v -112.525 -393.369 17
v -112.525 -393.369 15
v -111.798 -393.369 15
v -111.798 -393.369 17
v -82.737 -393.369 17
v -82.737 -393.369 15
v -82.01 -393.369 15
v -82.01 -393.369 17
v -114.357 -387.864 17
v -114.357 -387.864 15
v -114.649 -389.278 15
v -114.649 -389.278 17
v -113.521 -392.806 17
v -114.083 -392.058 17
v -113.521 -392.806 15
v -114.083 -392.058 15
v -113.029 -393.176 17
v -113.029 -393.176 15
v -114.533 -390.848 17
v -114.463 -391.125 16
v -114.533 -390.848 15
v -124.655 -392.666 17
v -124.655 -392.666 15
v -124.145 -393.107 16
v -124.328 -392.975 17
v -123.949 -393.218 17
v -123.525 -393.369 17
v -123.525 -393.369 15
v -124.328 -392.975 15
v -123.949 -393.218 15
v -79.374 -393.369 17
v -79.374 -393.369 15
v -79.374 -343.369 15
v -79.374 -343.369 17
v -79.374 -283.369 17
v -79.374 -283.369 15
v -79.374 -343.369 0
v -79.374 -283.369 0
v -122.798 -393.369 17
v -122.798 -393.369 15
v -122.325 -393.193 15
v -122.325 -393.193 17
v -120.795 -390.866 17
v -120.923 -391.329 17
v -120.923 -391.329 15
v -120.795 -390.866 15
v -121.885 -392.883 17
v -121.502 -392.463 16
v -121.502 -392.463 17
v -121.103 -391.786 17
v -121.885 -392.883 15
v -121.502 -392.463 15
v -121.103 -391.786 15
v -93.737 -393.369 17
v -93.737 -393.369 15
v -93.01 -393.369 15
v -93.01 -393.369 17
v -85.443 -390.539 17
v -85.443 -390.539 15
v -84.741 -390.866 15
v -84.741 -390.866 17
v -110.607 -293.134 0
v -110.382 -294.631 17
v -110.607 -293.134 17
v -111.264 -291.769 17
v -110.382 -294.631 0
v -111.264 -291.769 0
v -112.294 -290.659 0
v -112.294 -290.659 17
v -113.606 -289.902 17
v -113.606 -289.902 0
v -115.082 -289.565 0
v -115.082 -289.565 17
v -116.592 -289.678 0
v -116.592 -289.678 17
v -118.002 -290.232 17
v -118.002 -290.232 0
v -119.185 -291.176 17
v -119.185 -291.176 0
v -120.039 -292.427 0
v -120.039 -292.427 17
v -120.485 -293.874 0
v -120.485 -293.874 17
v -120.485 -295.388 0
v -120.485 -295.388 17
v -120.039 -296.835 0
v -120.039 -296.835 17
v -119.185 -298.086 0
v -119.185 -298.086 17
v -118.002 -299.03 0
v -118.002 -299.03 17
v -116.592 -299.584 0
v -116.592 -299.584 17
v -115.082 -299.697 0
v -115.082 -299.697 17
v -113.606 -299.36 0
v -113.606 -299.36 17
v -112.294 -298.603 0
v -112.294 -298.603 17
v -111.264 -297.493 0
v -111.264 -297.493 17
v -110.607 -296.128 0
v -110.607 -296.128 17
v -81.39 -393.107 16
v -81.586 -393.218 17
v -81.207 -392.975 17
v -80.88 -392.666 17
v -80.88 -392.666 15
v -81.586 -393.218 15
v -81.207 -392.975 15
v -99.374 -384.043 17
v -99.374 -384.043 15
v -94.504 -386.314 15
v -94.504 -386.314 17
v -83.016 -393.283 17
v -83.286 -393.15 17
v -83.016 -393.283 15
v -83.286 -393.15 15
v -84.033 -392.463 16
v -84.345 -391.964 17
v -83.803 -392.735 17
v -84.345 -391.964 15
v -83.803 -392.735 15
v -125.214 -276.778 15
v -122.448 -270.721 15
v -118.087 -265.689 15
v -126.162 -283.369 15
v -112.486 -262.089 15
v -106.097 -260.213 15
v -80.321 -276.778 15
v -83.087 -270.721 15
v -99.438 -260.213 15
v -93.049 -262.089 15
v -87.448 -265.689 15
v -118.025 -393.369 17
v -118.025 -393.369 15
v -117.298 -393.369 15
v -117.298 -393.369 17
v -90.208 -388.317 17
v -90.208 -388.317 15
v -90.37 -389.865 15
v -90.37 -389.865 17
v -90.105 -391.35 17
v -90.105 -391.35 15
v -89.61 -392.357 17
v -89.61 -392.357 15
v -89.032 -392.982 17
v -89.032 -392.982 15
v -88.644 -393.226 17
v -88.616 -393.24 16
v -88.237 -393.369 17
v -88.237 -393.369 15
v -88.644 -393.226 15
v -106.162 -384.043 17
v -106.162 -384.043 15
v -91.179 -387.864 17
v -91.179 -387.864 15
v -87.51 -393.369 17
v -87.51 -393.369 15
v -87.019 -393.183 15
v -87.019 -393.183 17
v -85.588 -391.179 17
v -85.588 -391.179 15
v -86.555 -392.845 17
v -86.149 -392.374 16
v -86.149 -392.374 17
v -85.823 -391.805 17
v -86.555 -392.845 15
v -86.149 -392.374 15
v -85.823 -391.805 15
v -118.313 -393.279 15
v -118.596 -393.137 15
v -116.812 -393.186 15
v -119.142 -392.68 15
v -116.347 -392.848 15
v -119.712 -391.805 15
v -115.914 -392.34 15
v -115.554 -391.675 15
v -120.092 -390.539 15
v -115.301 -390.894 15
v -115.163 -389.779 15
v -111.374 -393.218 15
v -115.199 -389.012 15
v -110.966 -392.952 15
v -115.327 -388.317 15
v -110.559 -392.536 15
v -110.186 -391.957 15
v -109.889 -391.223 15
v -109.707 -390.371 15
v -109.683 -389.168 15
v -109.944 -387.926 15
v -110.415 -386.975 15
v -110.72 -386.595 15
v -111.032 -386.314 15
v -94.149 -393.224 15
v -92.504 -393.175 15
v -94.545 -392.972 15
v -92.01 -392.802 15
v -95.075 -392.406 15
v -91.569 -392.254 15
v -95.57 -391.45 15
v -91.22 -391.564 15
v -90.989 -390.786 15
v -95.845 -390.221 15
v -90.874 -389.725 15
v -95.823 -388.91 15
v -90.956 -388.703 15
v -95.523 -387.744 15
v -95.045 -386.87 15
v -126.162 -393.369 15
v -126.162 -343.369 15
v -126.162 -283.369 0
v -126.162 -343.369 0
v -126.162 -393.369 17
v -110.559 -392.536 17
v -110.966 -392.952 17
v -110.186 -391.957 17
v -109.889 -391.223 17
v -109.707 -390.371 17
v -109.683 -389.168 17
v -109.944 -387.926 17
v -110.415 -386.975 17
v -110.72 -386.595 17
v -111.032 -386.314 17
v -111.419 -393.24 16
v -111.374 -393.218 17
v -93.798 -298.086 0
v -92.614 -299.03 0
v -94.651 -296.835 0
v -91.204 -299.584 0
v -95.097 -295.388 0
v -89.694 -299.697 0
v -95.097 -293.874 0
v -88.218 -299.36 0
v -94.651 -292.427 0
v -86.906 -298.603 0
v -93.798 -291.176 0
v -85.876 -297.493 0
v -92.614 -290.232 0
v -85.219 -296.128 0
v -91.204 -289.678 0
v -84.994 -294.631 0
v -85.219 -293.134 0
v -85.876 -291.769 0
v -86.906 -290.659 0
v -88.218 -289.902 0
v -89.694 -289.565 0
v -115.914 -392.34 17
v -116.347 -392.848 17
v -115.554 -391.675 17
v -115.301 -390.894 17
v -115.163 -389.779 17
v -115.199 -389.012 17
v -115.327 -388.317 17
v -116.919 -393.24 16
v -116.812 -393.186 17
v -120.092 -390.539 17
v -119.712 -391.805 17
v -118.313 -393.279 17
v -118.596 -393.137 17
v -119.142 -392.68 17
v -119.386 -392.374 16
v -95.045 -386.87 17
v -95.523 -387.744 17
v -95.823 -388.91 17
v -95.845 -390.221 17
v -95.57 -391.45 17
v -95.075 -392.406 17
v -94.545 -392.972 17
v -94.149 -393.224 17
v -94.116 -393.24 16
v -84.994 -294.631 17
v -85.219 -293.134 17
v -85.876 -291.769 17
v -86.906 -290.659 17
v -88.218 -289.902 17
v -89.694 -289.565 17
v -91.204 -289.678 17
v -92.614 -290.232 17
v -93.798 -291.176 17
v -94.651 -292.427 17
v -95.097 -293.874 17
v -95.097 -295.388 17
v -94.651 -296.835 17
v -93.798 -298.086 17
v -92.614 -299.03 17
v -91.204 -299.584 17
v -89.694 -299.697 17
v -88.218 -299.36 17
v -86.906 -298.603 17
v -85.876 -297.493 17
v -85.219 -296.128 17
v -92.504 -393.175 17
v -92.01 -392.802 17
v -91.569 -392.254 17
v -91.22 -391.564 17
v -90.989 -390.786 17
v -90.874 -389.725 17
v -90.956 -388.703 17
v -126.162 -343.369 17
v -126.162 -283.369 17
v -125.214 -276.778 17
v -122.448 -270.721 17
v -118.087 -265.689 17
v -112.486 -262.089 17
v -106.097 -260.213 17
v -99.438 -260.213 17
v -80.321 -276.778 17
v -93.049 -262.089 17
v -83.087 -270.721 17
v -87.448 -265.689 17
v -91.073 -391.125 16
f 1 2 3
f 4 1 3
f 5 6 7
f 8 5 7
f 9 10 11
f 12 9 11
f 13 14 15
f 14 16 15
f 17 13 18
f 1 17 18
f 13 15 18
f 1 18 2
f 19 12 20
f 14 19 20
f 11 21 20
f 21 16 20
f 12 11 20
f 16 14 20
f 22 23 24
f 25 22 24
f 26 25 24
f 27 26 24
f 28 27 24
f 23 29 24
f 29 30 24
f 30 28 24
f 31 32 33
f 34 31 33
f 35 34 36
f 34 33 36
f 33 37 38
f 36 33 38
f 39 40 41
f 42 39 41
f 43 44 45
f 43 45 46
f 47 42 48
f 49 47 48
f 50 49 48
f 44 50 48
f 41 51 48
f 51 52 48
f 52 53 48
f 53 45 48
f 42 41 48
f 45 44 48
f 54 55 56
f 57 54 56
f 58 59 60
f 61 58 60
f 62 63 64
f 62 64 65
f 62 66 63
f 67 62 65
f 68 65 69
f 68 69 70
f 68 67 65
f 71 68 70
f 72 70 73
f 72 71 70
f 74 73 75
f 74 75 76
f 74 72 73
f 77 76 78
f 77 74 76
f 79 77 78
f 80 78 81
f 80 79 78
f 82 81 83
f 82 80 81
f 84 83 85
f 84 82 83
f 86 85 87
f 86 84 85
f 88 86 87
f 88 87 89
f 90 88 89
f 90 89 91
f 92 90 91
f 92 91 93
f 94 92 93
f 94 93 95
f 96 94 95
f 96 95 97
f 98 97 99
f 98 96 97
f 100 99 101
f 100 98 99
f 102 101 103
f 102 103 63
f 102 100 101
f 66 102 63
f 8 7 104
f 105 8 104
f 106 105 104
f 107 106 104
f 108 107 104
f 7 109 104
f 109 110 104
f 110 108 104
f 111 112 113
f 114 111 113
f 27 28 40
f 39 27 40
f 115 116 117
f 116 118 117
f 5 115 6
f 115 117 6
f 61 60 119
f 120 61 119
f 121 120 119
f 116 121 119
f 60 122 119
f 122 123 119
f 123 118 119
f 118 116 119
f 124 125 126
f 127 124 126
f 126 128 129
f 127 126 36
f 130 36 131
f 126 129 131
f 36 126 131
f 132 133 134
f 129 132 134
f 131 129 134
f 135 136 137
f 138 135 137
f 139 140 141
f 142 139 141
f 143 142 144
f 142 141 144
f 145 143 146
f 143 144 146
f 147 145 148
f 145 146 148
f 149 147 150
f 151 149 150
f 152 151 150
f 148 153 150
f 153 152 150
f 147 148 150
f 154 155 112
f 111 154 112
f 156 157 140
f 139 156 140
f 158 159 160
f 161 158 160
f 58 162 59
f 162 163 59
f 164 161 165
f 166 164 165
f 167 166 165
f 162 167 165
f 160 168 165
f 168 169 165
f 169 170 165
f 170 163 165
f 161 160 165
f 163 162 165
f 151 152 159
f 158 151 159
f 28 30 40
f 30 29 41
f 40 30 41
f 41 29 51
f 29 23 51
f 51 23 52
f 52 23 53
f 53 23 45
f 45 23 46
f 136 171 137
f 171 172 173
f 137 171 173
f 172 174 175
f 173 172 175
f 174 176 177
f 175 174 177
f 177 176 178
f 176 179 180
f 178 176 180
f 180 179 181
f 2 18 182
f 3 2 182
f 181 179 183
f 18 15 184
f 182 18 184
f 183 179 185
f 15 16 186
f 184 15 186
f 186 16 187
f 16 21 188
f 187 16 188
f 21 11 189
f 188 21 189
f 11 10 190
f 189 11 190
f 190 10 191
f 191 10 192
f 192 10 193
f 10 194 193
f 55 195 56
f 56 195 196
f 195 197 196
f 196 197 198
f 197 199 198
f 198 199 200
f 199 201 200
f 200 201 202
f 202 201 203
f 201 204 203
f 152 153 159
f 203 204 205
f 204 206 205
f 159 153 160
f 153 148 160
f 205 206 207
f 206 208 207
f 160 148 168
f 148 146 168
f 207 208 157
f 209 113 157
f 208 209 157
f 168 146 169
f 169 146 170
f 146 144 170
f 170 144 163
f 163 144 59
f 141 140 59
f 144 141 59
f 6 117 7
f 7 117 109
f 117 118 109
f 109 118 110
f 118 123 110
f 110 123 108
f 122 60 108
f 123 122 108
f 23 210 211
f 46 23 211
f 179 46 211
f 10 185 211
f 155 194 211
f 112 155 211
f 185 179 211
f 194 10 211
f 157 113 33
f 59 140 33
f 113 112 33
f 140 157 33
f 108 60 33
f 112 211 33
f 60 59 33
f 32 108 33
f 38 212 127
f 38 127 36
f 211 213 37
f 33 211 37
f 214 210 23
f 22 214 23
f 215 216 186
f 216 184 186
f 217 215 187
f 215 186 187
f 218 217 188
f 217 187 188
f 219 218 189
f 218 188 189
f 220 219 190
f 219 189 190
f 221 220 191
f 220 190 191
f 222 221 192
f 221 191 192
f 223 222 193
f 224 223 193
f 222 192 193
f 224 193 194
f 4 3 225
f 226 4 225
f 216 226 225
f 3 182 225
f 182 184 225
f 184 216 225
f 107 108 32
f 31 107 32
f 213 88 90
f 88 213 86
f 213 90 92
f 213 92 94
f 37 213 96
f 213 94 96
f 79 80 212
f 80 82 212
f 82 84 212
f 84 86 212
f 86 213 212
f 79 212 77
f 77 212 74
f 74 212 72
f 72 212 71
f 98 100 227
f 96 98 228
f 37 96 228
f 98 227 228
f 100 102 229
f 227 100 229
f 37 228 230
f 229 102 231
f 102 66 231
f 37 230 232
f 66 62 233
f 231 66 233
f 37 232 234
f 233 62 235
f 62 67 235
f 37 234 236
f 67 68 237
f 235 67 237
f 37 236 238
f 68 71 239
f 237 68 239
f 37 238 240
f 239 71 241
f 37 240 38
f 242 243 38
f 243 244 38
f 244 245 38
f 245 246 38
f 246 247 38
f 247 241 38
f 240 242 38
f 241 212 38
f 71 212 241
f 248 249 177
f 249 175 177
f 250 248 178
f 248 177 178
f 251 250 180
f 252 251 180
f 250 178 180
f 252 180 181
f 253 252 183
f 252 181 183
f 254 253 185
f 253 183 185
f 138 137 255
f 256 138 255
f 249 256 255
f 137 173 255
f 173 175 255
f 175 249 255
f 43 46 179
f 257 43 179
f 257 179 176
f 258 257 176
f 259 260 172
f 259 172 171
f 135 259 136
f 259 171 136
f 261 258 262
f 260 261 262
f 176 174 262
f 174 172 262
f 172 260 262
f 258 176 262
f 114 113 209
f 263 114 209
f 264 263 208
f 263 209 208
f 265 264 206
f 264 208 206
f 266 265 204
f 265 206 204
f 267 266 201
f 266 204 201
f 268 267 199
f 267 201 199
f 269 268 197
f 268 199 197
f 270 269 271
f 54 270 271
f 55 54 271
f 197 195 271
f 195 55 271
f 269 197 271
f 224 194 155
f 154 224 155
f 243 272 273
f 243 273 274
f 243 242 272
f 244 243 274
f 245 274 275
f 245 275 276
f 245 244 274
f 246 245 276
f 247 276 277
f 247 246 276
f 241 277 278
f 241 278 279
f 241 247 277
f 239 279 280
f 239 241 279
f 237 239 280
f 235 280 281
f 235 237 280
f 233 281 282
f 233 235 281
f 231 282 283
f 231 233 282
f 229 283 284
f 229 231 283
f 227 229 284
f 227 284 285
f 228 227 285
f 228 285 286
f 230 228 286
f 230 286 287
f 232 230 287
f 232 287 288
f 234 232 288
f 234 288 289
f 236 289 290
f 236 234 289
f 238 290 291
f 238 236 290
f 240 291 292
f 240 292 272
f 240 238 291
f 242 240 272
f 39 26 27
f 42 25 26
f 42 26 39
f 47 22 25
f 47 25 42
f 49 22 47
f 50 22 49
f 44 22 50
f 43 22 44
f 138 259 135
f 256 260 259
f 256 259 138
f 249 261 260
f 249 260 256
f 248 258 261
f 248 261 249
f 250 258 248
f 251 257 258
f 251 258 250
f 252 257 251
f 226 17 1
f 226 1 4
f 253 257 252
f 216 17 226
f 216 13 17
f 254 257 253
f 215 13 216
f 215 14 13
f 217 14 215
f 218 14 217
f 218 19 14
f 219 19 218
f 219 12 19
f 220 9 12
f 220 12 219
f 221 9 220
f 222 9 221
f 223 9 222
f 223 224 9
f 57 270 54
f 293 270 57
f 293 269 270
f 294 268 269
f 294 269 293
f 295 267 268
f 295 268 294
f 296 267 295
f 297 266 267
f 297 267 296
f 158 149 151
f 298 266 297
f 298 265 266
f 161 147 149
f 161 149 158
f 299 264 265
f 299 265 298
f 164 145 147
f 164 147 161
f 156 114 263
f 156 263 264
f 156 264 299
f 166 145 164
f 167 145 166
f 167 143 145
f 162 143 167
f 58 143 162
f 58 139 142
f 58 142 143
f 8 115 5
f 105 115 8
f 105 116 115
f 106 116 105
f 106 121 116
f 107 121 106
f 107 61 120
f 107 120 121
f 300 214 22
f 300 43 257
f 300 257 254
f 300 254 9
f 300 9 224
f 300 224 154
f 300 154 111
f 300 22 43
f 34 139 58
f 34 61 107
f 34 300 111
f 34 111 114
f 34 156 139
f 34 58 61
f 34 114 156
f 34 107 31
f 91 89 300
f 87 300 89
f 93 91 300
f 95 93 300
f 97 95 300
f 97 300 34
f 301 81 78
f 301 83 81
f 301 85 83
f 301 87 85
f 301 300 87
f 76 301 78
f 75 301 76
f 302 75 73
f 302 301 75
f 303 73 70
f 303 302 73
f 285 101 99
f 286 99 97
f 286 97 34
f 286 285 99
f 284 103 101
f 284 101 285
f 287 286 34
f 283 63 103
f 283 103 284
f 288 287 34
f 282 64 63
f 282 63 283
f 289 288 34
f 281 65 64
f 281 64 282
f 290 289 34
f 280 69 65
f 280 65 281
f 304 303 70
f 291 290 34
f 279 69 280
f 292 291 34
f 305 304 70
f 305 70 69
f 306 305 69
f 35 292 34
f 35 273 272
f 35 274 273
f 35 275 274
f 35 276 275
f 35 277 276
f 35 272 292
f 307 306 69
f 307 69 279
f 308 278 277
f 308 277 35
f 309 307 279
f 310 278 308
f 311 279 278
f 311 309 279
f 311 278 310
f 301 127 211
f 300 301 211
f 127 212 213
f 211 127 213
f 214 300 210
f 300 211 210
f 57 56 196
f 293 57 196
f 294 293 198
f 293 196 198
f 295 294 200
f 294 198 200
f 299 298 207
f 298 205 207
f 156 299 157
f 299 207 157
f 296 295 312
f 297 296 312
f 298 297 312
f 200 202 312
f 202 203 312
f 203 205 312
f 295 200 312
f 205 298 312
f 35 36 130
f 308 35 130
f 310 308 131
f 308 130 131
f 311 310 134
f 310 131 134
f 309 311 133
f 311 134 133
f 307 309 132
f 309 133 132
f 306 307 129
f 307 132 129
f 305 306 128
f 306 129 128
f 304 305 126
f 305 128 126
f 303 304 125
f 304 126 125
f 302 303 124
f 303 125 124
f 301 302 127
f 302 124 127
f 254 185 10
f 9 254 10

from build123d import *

# Parameters (mm, degrees)
SKETCH1_W           = 46.787939469
SKETCH1_H           = 60
SKETCH1_R           = 5.08
BOSS_EXTRUDE1_DEPTH = 15
SKETCH2_W           = 46.787939469
SKETCH2_H           = 60
SKETCH2_R           = 5.08
BOSS_EXTRUDE2_DEPTH = 2


with BuildPart() as part:
    # Sketch1 → Boss-Extrude1 (new body)
    with BuildSketch(Plane.XY):
        with Locations((-102.767623853, -313.368909969)):
            Rectangle(SKETCH1_W, SKETCH1_H)
        with Locations((-90.073654119, -294.630909969)):
            Circle(SKETCH1_R, mode=Mode.SUBTRACT)
        with Locations((-115.461593588, -294.630909969)):
            Circle(SKETCH1_R, mode=Mode.SUBTRACT)
    extrude(amount=BOSS_EXTRUDE1_DEPTH)

    # Sketch2 → Boss-Extrude2 (add)
    with BuildSketch(Plane.XY.offset(15)):
        with BuildLine():
            Line((-79.373654119, -343.368909969), (-102.767623854, -343.368909969))
            Line((-102.767623854, -343.368909969), (-102.767623854, -384.042756806))
            Line((-102.767623854, -384.042756806), (-99.373654119, -384.042756806))
            Line((-99.373654119, -384.042756806), (-94.503579918, -386.313709702))
            add(Edge.make_bspline(
                [(-94.503579918, -386.313709702), (-100.00398624, -390.494082743), (-94.115799531, -393.239789298), (-93.929989905, -393.32643375), (-93.73748043, -393.368909969)],
                knots=[0.468972903, 0.468972903, 0.468972903, 2.84019184, 2.84019184, 3.029420352, 3.029420352, 3.029420352], degree=2, weights=[1, 0.37573231, 1, 0.950182059, 0.908315281]))
            Line((-93.73748043, -393.368909969), (-93.009827808, -393.368909969))
            add(Edge.make_bspline(
                [(-93.009827808, -393.368909969), (-89.462741956, -392.586263836), (-91.178526324, -387.864207656)],
                knots=[3.345008297, 3.345008297, 3.345008297, 5.211410777, 5.211410777, 5.211410777], degree=2, weights=[0.790783298, 0.508634675, 1]))
            Line((-91.178526324, -387.864207656), (-90.208062599, -388.316742323))
            add(Edge.make_bspline(
                [(-90.208062599, -388.316742323), (-91.162547167, -392.052221372), (-88.615799531, -393.239789298), (-88.429989905, -393.32643375), (-88.23748043, -393.368909969)],
                knots=[1.204788076, 1.204788076, 1.204788076, 2.84019184, 2.84019184, 3.008967996, 3.008967996, 3.008967996], degree=2, weights=[1, 0.683899664, 1, 0.967377965, 0.941489216]))
            Line((-88.23748043, -393.368909969), (-87.509827808, -393.368909969))
            add(Edge.make_bspline(
                [(-87.509827808, -393.368909969), (-85.839475159, -393.000355303), (-85.443416113, -390.538533468)],
                knots=[3.304458938, 3.304458938, 3.304458938, 4.475595603, 4.475595603, 4.475595603], degree=2, weights=[0.871477119, 0.773635905, 1]))
            Line((-85.443416113, -390.538533468), (-84.740509949, -390.866303995))
            add(Edge.make_bspline(
                [(-84.740509949, -390.866303995), (-84.248679529, -393.03547171), (-82.73748043, -393.368909969)],
                knots=[1.898629299, 1.898629299, 1.898629299, 2.984182814, 2.984182814, 2.984182814], degree=2, weights=[1, 0.762799808, 0.799074283]))
            Line((-82.73748043, -393.368909969), (-82.009827808, -393.368909969))
            add(Edge.make_bspline(
                [(-82.009827808, -393.368909969), (-81.386018968, -393.231269777), (-80.880341234, -392.666330229)],
                knots=[3.261132643, 3.261132643, 3.261132643, 3.781754381, 3.781754381, 3.781754381], degree=2, weights=[0.83538307, 0.886240914, 1]))
            Line((-80.880341234, -392.666330229), (-79.373654119, -393.368909969))
            Line((-79.373654119, -393.368909969), (-79.373654119, -343.368909969))
        make_face()
        with BuildLine():
            Line((-126.161593588, -343.368909969), (-126.161593588, -393.368909969))
            Line((-126.161593588, -393.368909969), (-124.654906474, -392.666330229))
            add(Edge.make_bspline(
                [(-124.654906474, -392.666330229), (-124.14922874, -393.231269777), (-123.525419899, -393.368909969)],
                knots=[2.501430927, 2.501430927, 2.501430927, 3.022052664, 3.022052664, 3.022052664], degree=2, weights=[1, 0.886240914, 0.83538307]))
            Line((-123.525419899, -393.368909969), (-122.797767278, -393.368909969))
            add(Edge.make_bspline(
                [(-122.797767278, -393.368909969), (-121.286568178, -393.03547171), (-120.794737759, -390.866303995)],
                knots=[3.299002493, 3.299002493, 3.299002493, 4.384556008, 4.384556008, 4.384556008], degree=2, weights=[0.799074283, 0.762799808, 1]))
            Line((-120.794737759, -390.866303995), (-120.091831594, -390.538533468))
            add(Edge.make_bspline(
                [(-120.091831594, -390.538533468), (-119.695772548, -393.000355303), (-118.025419899, -393.368909969)],
                knots=[1.807589704, 1.807589704, 1.807589704, 2.97872637, 2.97872637, 2.97872637], degree=2, weights=[1, 0.773635905, 0.871477119]))
            Line((-118.025419899, -393.368909969), (-117.297767278, -393.368909969))
            add(Edge.make_bspline(
                [(-117.297767278, -393.368909969), (-117.105257803, -393.32643375), (-116.919448176, -393.239789298), (-114.37270054, -392.052221372), (-115.327185108, -388.316742323)],
                knots=[3.274217312, 3.274217312, 3.274217312, 3.442993467, 3.442993467, 5.078397231, 5.078397231, 5.078397231], degree=2, weights=[0.941489216, 0.967377965, 1, 0.683899664, 1]))
            Line((-115.327185108, -388.316742323), (-114.356721383, -387.864207656))
            add(Edge.make_bspline(
                [(-114.356721383, -387.864207656), (-116.072505751, -392.586263836), (-112.525419899, -393.368909969)],
                knots=[1.071774531, 1.071774531, 1.071774531, 2.93817701, 2.93817701, 2.93817701], degree=2, weights=[1, 0.508634675, 0.790783298]))
            Line((-112.525419899, -393.368909969), (-111.797767278, -393.368909969))
            add(Edge.make_bspline(
                [(-111.797767278, -393.368909969), (-111.605257803, -393.32643375), (-111.419448176, -393.239789298), (-105.531261468, -390.494082743), (-111.031667789, -386.313709702)],
                knots=[3.253764955, 3.253764955, 3.253764955, 3.442993467, 3.442993467, 5.814212404, 5.814212404, 5.814212404], degree=2, weights=[0.908315281, 0.950182059, 1, 0.37573231, 1]))
            Line((-111.031667789, -386.313709702), (-106.161593588, -384.042756806))
            Line((-106.161593588, -384.042756806), (-102.767623854, -384.042756806))
            Line((-102.767623854, -384.042756806), (-102.767623854, -343.368909969))
            Line((-102.767623854, -343.368909969), (-126.161593588, -343.368909969))
        make_face()
        with Locations((-102.767623853, -313.368909969)):
            Rectangle(SKETCH2_W, SKETCH2_H)
        with Locations((-115.461593588, -294.630909969)):
            Circle(SKETCH2_R, mode=Mode.SUBTRACT)
        with Locations((-90.073654119, -294.630909969)):
            Circle(SKETCH2_R, mode=Mode.SUBTRACT)
        with BuildLine():
            ThreePointArc((-79.373654119, -283.368909969), (-102.767623854, -259.974940234), (-126.161593588, -283.368909969))
            Line((-126.161593588, -283.368909969), (-79.373654119, -283.368909969))
        make_face()
    extrude(amount=BOSS_EXTRUDE2_DEPTH)


solid = part.part
